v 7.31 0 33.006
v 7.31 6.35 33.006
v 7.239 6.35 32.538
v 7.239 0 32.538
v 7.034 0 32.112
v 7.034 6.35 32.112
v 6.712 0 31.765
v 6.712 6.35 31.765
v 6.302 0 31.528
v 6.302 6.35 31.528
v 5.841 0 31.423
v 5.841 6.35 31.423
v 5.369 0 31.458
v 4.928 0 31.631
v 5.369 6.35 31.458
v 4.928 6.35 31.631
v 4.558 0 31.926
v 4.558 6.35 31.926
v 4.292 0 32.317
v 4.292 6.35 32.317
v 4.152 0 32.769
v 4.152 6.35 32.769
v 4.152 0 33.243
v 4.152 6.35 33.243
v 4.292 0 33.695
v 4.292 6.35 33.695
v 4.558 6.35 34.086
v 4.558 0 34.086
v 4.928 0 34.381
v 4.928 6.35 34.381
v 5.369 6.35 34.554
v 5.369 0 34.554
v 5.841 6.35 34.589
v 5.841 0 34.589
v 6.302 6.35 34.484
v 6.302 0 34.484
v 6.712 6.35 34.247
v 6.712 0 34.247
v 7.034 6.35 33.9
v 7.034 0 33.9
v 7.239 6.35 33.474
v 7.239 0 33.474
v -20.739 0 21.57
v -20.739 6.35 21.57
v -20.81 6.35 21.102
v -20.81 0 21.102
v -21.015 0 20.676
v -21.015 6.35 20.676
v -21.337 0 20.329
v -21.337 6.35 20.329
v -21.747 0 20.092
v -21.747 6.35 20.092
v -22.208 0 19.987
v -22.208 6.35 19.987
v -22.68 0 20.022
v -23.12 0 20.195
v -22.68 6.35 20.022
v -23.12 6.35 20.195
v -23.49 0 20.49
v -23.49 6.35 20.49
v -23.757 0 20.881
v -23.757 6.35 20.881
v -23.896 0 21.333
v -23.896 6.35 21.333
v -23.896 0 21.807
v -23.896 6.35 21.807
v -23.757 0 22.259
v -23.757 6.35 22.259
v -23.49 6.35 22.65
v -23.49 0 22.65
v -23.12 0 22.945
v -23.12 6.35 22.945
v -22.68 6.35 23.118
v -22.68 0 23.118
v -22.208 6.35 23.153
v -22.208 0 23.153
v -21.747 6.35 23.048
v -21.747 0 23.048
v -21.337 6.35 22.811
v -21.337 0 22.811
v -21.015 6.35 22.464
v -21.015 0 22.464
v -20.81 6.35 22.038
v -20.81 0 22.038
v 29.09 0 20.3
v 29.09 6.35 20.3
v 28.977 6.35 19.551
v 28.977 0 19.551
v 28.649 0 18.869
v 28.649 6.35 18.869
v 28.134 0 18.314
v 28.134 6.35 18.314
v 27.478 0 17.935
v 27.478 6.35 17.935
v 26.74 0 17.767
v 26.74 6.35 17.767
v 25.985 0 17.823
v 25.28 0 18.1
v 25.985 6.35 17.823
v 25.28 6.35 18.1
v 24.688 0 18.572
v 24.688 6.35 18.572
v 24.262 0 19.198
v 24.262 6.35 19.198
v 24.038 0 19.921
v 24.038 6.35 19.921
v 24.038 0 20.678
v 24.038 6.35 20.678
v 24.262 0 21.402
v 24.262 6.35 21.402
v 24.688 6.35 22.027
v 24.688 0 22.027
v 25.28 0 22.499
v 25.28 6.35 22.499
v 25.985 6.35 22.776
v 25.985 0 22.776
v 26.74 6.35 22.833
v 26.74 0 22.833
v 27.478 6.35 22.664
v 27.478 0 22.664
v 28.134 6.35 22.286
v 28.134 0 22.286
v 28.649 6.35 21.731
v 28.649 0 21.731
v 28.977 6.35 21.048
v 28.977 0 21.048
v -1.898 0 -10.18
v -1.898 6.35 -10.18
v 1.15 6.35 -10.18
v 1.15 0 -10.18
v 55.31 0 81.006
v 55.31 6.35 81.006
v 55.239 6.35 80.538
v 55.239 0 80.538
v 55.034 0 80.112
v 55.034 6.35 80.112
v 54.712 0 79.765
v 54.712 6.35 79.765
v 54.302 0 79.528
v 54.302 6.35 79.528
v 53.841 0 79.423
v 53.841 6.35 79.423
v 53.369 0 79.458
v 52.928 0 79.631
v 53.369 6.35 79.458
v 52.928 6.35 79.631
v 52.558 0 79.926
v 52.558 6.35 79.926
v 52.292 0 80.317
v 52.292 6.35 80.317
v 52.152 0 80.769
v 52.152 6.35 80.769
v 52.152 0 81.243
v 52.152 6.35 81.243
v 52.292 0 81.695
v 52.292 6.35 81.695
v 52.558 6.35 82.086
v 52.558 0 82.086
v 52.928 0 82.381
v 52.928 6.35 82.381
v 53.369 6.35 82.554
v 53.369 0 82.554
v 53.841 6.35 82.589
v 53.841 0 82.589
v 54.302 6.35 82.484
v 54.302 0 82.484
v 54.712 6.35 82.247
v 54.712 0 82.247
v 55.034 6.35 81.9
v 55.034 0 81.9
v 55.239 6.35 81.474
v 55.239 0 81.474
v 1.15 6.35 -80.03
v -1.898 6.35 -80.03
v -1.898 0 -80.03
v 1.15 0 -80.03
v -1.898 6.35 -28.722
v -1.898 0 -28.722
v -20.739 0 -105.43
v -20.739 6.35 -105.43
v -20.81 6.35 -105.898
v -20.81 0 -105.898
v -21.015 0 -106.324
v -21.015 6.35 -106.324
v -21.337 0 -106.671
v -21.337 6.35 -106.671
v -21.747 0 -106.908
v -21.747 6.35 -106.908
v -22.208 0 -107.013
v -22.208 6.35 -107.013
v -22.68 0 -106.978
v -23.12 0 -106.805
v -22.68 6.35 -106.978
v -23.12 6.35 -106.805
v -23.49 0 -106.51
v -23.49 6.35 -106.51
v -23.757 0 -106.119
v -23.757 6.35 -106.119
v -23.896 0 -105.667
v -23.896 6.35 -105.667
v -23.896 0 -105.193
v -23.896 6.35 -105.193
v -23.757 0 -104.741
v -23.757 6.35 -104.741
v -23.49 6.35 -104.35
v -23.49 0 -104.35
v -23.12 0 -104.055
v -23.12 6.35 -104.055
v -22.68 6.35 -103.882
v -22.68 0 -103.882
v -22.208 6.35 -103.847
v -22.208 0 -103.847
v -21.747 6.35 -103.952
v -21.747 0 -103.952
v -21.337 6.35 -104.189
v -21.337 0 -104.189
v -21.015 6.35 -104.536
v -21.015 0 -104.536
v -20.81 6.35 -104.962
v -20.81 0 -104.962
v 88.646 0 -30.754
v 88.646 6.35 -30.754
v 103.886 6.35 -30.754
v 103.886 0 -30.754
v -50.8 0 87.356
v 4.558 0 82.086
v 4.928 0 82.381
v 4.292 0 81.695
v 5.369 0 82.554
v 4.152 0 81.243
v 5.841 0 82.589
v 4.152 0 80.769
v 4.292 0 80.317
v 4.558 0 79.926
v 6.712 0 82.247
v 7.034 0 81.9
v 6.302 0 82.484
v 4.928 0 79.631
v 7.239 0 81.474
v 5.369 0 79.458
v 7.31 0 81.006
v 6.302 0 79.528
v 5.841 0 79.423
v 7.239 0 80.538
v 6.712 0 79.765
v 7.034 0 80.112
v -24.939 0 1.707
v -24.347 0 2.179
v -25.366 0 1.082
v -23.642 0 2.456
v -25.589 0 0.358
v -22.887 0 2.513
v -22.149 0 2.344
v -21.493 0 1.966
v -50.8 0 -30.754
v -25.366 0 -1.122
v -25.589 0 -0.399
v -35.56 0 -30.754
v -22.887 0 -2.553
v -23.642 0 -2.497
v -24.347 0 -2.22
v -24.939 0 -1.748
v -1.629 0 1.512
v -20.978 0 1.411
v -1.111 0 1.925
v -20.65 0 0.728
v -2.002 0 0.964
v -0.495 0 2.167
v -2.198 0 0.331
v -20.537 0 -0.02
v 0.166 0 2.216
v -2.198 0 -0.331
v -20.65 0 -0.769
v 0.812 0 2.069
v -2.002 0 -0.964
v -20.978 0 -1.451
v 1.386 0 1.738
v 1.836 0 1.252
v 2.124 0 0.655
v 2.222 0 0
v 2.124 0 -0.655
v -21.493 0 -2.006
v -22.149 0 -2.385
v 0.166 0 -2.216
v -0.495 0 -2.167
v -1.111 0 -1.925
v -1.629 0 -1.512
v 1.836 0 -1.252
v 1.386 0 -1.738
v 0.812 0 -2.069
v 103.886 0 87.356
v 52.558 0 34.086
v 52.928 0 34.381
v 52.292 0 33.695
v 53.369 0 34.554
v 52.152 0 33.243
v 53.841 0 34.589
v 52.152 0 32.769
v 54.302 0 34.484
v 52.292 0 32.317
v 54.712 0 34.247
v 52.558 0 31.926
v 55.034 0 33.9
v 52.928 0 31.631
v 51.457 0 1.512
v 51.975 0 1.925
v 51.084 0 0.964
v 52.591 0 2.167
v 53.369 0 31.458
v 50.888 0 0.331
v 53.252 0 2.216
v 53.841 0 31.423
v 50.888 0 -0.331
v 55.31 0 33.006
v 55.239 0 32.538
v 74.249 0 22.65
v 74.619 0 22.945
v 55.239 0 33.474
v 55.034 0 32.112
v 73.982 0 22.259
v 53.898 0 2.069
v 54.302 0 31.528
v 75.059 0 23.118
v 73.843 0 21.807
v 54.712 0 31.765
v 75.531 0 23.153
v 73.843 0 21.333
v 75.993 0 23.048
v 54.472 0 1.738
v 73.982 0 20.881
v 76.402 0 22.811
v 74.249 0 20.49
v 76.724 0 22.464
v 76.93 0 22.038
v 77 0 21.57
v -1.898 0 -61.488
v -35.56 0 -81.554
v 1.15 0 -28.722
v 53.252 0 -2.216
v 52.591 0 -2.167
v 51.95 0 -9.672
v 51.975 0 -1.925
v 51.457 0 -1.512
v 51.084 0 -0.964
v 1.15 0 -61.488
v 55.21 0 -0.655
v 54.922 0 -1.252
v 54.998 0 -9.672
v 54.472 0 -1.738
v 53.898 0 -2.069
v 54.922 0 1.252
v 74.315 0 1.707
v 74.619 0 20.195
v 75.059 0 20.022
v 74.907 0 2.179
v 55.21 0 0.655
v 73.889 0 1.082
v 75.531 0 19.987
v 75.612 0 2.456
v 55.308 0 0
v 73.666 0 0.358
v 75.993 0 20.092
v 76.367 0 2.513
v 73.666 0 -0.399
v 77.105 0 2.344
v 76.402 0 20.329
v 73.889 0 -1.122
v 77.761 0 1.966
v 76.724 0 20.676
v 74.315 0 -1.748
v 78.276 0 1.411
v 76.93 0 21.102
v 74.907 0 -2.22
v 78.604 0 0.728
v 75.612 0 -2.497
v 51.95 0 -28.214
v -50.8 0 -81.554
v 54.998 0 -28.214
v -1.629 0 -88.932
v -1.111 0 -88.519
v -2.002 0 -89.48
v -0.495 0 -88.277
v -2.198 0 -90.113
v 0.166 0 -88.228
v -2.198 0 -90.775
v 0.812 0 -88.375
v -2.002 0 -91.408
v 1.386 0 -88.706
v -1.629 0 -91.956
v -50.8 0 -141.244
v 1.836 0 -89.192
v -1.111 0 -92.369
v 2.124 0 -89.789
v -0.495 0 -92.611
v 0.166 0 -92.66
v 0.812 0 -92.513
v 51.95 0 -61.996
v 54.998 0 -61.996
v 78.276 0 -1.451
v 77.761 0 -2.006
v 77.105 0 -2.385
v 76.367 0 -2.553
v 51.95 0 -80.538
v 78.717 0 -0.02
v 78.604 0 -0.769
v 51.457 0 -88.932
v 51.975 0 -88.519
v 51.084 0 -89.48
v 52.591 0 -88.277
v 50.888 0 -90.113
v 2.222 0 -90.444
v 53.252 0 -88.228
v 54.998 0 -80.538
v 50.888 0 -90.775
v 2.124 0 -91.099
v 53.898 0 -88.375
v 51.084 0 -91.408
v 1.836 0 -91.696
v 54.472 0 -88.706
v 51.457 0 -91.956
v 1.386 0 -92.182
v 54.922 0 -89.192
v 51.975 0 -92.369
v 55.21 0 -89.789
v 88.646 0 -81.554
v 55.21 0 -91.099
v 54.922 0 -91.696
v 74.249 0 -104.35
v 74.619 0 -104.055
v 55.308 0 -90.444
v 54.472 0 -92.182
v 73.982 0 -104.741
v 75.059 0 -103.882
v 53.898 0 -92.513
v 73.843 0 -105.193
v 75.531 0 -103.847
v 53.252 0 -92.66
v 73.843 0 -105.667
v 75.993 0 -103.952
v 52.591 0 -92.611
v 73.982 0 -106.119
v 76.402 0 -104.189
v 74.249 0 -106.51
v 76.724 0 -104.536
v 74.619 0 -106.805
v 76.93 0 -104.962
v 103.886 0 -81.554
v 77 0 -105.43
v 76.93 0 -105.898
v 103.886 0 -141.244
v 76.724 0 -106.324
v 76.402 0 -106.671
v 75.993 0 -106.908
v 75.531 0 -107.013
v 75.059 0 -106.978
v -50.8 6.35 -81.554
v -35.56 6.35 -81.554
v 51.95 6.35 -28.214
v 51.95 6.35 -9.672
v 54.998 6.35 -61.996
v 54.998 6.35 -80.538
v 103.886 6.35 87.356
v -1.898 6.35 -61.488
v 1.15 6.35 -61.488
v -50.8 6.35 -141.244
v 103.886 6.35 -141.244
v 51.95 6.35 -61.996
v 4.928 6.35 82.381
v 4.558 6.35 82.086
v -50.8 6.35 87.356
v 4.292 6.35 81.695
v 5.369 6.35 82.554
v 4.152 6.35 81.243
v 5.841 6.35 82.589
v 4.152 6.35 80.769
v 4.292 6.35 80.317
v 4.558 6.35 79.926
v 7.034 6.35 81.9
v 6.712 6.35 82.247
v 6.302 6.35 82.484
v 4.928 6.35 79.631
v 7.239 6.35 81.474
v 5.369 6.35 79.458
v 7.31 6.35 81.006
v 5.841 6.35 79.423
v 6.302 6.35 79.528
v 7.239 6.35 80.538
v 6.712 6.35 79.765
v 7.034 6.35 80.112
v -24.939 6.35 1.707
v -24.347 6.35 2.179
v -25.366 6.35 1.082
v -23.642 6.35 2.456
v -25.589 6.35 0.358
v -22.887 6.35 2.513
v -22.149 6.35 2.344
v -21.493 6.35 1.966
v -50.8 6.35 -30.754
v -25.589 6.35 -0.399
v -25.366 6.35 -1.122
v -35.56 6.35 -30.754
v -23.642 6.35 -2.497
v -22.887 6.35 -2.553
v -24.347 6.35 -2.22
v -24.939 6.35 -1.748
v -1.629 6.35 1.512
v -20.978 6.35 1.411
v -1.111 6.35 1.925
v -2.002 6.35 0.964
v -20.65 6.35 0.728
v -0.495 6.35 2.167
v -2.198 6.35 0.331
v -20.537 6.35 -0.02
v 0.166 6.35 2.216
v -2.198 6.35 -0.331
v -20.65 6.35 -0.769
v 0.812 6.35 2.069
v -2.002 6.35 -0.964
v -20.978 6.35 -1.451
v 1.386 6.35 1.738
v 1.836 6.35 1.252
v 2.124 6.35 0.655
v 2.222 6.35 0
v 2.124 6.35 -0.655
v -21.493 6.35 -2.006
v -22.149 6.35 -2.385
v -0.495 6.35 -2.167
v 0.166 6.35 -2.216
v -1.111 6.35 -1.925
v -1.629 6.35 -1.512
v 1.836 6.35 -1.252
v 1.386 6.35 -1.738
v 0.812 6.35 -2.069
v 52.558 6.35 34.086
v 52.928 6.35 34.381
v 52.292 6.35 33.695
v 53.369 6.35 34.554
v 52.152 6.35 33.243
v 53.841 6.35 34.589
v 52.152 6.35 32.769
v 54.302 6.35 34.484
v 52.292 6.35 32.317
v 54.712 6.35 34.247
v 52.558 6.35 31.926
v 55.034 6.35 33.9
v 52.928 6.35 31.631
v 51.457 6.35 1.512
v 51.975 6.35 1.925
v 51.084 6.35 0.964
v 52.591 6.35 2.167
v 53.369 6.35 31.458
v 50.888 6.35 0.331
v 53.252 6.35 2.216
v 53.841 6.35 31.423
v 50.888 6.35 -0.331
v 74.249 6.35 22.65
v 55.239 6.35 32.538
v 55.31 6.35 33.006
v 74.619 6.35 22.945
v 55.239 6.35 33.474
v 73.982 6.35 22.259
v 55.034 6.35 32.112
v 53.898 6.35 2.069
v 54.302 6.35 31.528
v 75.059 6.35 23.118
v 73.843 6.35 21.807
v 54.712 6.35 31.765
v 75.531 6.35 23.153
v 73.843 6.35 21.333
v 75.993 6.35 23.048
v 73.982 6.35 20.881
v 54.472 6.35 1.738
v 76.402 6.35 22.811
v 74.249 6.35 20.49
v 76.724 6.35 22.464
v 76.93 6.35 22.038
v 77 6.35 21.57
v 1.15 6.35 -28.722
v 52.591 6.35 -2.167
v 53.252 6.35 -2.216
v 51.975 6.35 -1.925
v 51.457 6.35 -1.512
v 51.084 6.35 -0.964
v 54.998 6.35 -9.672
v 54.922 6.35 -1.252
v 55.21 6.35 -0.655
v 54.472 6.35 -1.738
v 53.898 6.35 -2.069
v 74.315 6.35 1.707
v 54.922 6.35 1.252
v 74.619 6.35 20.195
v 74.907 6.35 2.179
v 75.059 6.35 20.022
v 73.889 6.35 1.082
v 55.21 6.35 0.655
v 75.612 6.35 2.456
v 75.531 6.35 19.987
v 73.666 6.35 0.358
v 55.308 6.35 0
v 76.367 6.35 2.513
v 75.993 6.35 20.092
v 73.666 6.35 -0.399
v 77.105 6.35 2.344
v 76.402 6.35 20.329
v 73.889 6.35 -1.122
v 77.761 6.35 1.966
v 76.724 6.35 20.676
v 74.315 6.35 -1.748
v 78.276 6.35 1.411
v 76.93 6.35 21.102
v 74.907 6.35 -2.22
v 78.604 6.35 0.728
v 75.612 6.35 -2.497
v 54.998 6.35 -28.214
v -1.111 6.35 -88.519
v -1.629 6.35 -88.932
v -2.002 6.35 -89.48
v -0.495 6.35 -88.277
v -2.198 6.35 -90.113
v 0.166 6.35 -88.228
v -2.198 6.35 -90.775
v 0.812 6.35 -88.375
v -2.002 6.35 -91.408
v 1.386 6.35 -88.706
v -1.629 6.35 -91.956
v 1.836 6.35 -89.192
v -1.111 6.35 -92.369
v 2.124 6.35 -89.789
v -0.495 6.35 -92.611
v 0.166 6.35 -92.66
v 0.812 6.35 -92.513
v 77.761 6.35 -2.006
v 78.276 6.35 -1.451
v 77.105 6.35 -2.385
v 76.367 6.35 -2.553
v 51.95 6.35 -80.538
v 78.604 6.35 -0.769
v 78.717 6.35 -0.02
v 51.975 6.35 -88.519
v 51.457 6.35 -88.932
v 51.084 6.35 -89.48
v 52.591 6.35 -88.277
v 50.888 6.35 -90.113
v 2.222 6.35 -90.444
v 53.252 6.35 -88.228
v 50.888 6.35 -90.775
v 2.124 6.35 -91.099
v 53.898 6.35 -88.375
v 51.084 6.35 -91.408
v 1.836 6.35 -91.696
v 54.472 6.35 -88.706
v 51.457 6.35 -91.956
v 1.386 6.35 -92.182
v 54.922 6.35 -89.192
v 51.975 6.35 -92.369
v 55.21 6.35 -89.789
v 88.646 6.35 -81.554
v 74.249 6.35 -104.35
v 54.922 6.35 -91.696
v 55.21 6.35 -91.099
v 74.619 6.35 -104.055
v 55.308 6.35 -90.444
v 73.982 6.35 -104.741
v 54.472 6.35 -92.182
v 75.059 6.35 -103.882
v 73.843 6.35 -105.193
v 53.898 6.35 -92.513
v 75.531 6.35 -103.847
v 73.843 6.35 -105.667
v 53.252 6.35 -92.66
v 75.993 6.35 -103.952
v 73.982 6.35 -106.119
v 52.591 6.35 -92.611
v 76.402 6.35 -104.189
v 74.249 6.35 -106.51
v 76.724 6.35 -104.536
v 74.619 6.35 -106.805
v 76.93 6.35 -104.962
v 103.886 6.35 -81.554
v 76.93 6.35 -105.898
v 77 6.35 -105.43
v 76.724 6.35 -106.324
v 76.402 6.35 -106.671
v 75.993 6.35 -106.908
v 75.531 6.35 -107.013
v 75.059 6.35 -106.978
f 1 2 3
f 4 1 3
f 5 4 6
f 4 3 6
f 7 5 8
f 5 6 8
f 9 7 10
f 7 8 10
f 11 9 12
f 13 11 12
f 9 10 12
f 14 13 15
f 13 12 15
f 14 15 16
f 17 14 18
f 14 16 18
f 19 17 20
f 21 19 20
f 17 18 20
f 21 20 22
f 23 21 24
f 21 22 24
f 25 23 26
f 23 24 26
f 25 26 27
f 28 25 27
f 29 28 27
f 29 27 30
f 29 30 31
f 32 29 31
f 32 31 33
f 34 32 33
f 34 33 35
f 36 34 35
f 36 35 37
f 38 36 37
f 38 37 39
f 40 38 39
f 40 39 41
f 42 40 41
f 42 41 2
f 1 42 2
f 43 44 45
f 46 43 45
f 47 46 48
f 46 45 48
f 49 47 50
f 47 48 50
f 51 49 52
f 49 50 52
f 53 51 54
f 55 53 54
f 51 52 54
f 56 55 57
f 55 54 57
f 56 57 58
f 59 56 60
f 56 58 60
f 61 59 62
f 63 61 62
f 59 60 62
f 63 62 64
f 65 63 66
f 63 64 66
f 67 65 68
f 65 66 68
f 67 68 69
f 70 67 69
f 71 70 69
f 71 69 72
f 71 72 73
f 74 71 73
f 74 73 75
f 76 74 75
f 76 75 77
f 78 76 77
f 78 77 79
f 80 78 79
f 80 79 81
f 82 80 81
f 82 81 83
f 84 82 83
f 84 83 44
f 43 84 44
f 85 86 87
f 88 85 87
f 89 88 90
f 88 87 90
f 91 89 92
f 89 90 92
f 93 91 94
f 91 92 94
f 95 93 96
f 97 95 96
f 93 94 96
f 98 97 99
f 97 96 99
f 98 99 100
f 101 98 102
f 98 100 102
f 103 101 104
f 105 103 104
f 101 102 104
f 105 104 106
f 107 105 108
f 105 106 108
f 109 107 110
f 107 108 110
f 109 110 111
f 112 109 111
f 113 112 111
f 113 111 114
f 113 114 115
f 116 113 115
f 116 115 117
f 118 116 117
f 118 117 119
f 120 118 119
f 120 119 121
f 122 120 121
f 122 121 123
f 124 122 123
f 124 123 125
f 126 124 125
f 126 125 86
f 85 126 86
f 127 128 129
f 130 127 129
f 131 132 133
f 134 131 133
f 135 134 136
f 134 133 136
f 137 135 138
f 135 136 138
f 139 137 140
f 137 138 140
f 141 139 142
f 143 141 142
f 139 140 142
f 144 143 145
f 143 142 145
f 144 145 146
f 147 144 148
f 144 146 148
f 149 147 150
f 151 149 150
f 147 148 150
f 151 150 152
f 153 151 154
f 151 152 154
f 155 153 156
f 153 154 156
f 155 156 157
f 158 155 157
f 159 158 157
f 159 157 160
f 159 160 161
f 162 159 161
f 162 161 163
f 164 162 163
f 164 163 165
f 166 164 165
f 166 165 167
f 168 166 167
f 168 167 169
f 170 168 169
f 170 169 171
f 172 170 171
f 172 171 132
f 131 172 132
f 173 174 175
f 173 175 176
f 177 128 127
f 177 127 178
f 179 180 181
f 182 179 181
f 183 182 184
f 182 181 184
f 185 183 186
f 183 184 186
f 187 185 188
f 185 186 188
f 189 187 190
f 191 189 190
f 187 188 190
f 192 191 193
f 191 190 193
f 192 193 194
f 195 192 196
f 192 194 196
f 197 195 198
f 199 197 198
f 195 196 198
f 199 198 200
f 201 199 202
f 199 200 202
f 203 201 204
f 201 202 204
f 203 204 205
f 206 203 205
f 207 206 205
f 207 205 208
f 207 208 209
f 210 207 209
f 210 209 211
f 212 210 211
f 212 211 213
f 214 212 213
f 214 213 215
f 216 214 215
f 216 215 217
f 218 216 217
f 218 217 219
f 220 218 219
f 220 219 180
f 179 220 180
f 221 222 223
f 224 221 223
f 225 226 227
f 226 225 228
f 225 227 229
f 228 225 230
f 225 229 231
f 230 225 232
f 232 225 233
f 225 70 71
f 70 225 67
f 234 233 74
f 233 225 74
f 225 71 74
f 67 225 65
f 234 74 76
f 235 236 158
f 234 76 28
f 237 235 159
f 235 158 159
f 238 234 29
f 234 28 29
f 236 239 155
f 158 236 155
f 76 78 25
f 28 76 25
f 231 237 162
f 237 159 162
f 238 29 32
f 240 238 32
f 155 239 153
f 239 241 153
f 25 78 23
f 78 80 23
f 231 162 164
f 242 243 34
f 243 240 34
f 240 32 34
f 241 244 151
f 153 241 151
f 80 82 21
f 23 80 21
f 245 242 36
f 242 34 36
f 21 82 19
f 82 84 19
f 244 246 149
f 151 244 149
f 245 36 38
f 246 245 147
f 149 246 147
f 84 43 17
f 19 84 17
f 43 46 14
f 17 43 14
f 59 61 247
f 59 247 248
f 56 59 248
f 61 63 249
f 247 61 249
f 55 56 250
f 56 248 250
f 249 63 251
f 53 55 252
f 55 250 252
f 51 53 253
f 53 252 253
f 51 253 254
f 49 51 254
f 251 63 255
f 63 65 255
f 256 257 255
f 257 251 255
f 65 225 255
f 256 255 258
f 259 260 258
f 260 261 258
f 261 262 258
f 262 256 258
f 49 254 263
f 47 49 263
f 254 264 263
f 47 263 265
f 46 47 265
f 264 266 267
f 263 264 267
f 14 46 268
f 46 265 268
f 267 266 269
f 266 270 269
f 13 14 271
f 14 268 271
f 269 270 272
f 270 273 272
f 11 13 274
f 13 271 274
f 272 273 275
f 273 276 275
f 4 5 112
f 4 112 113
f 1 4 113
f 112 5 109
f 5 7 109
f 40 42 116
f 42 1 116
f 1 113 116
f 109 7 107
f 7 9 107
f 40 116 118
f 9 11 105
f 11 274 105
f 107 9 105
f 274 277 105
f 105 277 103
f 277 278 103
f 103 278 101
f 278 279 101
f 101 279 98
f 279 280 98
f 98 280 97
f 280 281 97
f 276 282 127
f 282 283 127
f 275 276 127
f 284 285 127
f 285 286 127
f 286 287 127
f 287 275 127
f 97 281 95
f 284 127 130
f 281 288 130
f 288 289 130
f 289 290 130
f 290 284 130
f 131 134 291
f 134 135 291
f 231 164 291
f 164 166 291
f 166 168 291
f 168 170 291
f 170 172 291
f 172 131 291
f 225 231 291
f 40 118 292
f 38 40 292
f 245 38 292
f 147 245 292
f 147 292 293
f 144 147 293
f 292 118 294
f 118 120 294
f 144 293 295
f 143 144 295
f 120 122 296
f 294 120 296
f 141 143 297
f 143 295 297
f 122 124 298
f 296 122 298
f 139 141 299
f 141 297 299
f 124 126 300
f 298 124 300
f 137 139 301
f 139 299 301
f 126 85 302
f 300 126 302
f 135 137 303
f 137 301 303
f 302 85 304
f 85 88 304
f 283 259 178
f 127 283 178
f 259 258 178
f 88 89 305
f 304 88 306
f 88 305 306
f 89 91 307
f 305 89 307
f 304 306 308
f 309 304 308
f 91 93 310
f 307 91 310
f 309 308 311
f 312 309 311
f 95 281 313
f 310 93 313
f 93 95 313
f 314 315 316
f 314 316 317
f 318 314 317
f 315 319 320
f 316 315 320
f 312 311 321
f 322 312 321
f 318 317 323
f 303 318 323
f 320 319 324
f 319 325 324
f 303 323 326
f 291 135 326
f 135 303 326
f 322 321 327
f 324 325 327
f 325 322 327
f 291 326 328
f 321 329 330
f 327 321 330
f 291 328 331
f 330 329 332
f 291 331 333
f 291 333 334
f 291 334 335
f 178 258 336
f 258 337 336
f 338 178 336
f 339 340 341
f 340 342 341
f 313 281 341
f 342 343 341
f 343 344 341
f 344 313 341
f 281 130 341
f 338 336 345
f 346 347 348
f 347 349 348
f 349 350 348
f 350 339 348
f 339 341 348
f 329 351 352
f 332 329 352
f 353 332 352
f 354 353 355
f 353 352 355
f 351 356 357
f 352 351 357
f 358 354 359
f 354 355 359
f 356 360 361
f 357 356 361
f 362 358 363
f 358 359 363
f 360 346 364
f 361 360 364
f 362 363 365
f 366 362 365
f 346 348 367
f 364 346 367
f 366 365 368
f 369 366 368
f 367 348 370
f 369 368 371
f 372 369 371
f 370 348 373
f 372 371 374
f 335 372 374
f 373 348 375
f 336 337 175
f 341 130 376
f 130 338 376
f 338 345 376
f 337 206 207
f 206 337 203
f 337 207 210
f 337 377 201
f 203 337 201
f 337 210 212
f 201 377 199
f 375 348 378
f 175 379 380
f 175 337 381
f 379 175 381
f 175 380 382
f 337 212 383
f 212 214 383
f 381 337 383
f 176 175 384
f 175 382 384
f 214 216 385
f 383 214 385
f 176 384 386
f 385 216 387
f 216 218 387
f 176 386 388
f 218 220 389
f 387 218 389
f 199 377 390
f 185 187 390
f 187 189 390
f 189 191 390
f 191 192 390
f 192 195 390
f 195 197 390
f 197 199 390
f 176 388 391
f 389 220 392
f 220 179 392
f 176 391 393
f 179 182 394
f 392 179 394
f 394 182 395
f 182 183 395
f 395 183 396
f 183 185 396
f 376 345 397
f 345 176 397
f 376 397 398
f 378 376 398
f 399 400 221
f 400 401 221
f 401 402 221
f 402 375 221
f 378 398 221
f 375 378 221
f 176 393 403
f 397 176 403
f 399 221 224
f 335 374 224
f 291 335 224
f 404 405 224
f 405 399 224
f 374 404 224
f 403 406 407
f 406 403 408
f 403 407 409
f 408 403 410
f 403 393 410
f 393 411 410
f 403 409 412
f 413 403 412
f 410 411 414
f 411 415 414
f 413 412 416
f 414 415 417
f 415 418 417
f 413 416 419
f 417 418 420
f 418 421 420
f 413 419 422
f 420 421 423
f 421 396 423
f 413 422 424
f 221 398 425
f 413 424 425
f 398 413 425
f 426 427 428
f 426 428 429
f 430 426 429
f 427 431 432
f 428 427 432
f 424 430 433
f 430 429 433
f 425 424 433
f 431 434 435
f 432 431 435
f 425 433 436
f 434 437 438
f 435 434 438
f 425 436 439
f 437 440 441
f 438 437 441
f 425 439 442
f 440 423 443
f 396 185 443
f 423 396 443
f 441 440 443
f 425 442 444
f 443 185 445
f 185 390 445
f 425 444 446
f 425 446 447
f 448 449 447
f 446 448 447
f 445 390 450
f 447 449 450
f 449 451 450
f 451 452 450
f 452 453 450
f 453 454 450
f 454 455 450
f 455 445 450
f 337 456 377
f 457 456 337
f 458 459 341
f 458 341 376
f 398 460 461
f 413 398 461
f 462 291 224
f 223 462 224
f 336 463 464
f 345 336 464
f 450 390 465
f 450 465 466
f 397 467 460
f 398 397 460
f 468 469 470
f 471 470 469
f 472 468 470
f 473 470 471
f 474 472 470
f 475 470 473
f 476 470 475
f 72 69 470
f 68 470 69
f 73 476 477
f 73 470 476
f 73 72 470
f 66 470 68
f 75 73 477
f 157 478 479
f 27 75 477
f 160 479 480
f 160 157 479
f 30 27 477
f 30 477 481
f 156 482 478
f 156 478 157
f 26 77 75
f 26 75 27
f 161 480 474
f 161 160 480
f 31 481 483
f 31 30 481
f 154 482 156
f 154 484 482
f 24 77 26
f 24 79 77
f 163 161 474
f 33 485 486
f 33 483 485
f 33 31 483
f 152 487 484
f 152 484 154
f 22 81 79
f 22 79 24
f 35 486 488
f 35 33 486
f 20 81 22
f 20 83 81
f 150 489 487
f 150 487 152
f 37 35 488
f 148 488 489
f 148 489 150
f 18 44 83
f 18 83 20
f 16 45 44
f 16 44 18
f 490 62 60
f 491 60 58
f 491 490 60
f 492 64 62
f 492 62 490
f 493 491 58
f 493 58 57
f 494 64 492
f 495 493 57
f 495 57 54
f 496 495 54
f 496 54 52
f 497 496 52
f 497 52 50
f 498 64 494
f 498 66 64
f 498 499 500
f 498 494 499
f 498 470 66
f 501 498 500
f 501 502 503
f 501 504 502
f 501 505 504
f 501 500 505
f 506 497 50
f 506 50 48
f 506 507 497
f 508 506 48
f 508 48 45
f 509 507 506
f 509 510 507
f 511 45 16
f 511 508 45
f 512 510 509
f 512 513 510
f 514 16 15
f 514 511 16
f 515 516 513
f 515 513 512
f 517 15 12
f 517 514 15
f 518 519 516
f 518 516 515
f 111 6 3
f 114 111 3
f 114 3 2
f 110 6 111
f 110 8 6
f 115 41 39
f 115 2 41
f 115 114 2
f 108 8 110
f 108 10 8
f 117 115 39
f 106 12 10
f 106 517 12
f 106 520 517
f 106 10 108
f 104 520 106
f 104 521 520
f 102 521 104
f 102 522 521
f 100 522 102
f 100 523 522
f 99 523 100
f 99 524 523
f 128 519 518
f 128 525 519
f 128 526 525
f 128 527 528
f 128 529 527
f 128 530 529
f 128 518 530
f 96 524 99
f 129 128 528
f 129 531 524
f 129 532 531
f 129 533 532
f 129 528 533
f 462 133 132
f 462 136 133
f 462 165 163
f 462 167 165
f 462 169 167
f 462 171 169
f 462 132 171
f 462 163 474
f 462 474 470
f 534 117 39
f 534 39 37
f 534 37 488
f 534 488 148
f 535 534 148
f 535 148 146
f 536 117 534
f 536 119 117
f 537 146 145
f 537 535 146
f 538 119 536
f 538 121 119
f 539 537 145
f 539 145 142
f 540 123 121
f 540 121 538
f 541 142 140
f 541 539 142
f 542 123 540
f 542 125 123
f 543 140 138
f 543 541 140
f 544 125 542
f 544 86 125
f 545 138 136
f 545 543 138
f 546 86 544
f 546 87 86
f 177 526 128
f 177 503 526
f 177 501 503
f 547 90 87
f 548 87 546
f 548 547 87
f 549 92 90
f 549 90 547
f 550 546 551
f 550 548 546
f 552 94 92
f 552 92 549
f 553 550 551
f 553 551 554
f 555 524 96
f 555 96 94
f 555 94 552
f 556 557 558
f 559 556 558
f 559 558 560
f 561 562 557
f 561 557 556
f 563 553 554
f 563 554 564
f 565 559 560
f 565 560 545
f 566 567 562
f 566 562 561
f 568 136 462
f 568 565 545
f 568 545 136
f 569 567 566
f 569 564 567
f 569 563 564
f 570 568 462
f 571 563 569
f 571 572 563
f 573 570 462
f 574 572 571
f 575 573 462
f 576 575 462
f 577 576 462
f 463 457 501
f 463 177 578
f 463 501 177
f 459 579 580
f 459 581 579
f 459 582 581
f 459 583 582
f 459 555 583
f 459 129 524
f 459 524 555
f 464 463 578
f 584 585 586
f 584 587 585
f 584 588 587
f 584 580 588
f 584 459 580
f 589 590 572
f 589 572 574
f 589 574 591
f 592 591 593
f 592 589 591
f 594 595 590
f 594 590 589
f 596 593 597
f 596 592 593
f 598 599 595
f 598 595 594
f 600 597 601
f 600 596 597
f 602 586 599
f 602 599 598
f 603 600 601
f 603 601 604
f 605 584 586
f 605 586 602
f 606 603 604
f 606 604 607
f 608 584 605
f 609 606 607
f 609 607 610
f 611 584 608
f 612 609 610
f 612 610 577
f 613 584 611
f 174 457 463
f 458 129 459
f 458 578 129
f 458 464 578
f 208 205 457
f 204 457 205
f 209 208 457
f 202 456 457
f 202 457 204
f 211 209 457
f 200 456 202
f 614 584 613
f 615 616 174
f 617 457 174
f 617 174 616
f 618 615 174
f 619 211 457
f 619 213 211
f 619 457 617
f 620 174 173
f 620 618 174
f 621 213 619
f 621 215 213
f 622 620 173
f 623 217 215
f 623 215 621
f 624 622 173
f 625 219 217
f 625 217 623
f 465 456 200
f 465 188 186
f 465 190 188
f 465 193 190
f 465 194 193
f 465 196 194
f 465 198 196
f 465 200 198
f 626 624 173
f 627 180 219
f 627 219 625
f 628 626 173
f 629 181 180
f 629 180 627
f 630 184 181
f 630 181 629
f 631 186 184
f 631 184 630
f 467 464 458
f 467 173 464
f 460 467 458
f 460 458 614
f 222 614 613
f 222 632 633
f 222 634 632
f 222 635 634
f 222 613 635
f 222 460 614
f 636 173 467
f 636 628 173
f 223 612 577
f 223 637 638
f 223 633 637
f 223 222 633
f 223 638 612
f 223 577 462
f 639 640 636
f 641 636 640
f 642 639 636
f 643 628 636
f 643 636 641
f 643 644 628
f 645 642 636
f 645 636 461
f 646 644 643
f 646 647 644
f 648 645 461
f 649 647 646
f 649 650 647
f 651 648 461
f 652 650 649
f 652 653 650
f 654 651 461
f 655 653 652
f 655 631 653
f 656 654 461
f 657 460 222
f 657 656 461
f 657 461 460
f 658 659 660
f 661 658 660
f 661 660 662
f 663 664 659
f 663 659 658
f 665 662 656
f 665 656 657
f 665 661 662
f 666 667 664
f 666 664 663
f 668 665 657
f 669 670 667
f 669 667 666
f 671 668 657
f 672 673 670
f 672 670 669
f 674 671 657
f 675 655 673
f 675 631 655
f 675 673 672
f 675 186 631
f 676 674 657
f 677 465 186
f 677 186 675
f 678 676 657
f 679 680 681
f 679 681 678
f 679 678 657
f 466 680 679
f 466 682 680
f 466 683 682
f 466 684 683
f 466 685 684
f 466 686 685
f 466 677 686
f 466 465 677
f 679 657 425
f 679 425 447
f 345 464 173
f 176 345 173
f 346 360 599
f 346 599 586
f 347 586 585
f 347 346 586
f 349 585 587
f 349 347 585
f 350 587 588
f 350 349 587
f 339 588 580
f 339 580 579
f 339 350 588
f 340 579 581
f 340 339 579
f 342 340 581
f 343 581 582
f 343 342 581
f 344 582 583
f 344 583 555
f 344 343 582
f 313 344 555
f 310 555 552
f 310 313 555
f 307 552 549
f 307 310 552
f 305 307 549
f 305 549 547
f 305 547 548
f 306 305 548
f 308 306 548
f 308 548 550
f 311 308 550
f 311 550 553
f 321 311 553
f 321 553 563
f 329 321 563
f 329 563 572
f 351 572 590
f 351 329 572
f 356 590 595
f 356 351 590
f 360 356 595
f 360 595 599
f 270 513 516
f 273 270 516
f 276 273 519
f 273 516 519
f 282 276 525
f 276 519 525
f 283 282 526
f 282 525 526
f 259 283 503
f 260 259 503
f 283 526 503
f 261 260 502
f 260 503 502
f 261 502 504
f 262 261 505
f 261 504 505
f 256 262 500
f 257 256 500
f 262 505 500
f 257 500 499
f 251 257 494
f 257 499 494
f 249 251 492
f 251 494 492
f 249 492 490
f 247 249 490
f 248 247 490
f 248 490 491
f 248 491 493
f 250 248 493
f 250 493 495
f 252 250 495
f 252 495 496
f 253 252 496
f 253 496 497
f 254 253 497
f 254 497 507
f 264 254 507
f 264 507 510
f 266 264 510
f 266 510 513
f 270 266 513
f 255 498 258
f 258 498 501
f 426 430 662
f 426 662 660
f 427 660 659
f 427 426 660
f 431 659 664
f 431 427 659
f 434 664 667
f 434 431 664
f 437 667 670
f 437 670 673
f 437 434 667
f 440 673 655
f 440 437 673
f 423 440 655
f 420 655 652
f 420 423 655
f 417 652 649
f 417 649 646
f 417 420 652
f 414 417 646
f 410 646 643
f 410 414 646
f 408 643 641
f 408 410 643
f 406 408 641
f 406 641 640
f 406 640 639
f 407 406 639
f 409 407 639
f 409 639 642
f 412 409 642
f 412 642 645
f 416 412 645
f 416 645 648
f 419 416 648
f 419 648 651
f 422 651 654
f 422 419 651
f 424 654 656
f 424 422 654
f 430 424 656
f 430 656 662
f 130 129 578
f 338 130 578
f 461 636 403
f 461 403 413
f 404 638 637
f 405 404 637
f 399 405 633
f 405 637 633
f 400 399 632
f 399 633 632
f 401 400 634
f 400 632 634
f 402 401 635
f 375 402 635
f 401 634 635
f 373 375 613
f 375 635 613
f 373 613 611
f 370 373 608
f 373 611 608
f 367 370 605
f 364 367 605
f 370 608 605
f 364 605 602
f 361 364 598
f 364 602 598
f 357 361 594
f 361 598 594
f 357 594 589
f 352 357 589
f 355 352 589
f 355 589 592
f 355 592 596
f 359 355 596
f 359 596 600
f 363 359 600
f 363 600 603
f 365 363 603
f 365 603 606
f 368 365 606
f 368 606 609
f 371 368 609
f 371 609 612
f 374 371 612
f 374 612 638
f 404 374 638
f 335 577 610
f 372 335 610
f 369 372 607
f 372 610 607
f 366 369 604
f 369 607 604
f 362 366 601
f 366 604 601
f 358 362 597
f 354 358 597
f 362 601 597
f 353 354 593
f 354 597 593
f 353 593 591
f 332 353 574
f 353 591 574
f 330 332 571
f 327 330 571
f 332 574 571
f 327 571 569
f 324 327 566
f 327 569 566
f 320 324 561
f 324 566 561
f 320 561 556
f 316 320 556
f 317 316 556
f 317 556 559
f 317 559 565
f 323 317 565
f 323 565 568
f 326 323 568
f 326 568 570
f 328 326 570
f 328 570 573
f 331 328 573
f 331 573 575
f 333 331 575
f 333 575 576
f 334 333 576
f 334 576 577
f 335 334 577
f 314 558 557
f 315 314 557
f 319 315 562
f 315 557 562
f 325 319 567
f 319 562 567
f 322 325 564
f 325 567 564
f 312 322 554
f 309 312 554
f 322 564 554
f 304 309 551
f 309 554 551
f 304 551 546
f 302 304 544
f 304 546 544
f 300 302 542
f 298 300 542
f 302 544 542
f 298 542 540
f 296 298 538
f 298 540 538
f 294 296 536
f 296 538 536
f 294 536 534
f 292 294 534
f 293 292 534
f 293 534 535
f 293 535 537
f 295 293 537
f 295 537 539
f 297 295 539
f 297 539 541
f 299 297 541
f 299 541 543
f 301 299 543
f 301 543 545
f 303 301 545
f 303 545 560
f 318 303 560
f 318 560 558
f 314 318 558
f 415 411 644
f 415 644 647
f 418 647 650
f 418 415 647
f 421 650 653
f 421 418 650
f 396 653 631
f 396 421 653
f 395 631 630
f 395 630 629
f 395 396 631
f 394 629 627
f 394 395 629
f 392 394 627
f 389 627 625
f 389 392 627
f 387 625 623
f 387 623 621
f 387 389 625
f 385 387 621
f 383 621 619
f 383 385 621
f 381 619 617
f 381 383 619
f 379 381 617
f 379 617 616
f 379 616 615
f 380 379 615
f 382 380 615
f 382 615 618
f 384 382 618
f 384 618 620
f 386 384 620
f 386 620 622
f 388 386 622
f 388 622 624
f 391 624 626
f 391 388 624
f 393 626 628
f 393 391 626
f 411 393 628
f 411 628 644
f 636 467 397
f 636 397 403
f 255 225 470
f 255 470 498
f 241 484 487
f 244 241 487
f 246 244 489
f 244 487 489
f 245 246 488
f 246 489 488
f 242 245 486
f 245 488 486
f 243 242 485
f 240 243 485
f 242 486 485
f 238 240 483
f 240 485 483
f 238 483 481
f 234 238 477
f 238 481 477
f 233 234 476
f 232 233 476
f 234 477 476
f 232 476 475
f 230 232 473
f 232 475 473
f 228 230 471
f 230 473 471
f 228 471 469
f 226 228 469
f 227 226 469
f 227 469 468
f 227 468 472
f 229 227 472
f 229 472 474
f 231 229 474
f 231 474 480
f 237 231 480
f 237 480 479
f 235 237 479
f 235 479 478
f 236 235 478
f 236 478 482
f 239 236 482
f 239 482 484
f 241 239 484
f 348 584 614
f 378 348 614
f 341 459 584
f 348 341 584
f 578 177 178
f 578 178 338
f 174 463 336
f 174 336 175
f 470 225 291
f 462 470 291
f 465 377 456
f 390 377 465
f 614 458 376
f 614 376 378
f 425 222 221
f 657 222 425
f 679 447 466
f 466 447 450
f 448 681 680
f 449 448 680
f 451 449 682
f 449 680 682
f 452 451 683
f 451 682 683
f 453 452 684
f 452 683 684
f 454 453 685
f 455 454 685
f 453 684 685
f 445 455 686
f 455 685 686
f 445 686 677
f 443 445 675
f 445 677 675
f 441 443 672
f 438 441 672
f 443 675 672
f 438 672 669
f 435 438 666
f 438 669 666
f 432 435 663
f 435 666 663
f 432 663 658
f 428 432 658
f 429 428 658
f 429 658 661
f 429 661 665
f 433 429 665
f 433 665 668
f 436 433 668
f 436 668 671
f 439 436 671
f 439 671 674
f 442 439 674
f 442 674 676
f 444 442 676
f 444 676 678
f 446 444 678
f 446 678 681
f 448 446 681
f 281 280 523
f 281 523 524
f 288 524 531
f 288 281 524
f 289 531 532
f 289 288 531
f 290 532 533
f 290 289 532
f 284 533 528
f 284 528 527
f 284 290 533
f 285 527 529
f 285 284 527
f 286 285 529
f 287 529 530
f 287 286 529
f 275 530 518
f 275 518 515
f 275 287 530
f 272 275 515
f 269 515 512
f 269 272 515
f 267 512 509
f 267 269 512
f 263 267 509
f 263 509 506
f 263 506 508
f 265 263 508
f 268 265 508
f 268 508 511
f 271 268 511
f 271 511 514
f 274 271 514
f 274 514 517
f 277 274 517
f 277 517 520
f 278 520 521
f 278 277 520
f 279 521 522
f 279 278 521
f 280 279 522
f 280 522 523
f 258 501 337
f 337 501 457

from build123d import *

# Parameters (mm, degrees)
SKETCH2_W           = 154.686
SKETCH2_H           = 228.6
BOSS_EXTRUDE1_DEPTH = 6.35
SKETCH1_R           = 2.2225
CUT_EXTRUDE1_DEPTH  = 6.35
SKETCH3_W           = 15.24
SKETCH3_H           = 50.8
CUT_EXTRUDE2_DEPTH  = 6.35
SKETCH8_R           = 2.54
CUT_EXTRUDE3_DEPTH  = 17.78
SKETCH9_R           = 1.5875
CUT_EXTRUDE4_DEPTH  = 17.78
SKETCH10_R          = 1.5875
CUT_EXTRUDE5_DEPTH  = 10.16
SKETCH12_W          = 3.048
SKETCH12_H          = 18.542
CUT_EXTRUDE7_DEPTH  = 8.255


with BuildPart() as part:
    # Sketch2 → Boss-Extrude1 (new body)
    with BuildSketch(Plane(origin=(0, 0, 0), x_dir=(1, 0, 0), z_dir=(0, 1, 0))):
        with Locations((26.543, 26.944051327)):
            Rectangle(SKETCH2_W, SKETCH2_H)
    extrude(amount=BOSS_EXTRUDE1_DEPTH)

    # Sketch1 → Cut-Extrude1 (cut)
    with BuildSketch(Plane(origin=(0, 0, 0), x_dir=(1, 0, 0), z_dir=(0, 1, 0))):
        with Locations((0, 90.444051327)):
            Circle(SKETCH1_R)
        with Locations((53.086, 90.444051327)):
            Circle(SKETCH1_R)
        Circle(SKETCH1_R)
        with Locations((53.086, 0)):
            Circle(SKETCH1_R)
    extrude(amount=CUT_EXTRUDE1_DEPTH, mode=Mode.SUBTRACT)

    # Sketch3 → Cut-Extrude2 (cut)
    with BuildSketch(Plane(origin=(0, 6.35, 0), x_dir=(1, 0, 0), z_dir=(0, 1, 0))):
        with Locations((96.266, 56.154051327)):
            Rectangle(SKETCH3_W, SKETCH3_H)
        with Locations((-43.18, 56.154051327)):
            Rectangle(SKETCH3_W, SKETCH3_H)
    extrude(amount=-CUT_EXTRUDE2_DEPTH, mode=Mode.SUBTRACT)

    # Sketch8 → Cut-Extrude3 (cut)
    with BuildSketch(Plane(origin=(0, 6.35, 0), x_dir=(1, 0, 0), z_dir=(0, 1, 0))):
        with Locations((26.550112, -20.29968)):
            Circle(SKETCH8_R)
        with Locations((-23.077082804, 0.02032)):
            Circle(SKETCH8_R)
        with Locations((76.177306804, 0.02032)):
            Circle(SKETCH8_R)
    extrude(amount=-CUT_EXTRUDE3_DEPTH, mode=Mode.SUBTRACT)

    # Sketch9 → Cut-Extrude4 (cut)
    with BuildSketch(Plane(origin=(0, 6.35, 0), x_dir=(1, 0, 0), z_dir=(0, 1, 0))):
        with Locations((53.722112, -33.005948673)):
            Circle(SKETCH9_R)
        with Locations((5.722112, -33.005948673)):
            Circle(SKETCH9_R)
        with Locations((53.722112, -81.005948673)):
            Circle(SKETCH9_R)
        with Locations((5.722112, -81.005948673)):
            Circle(SKETCH9_R)
    extrude(amount=-CUT_EXTRUDE4_DEPTH, mode=Mode.SUBTRACT)

    # Sketch10 → Cut-Extrude5 (cut)
    with BuildSketch(Plane(origin=(0, 6.35, 0), x_dir=(1, 0, 0), z_dir=(0, 1, 0))):
        with Locations((-22.3266, 105.430051327)):
            Circle(SKETCH10_R)
        with Locations((-22.3266, -21.569948673)):
            Circle(SKETCH10_R)
        with Locations((75.4126, 105.430051327)):
            Circle(SKETCH10_R)
        with Locations((75.4126, -21.569948673)):
            Circle(SKETCH10_R)
    extrude(amount=-CUT_EXTRUDE5_DEPTH, mode=Mode.SUBTRACT)

    # Sketch12 → Cut-Extrude7 (cut)
    with BuildSketch(Plane(origin=(0, 6.35, 0), x_dir=(1, 0, 0), z_dir=(0, 1, 0))):
        with Locations((-0.373888, 19.451051327)):
            Rectangle(SKETCH12_W, SKETCH12_H)
        with Locations((-0.373888, 70.759051327)):
            Rectangle(SKETCH12_W, SKETCH12_H)
        with Locations((53.474112, 71.267051327)):
            Rectangle(SKETCH12_W, SKETCH12_H)
        with Locations((53.474112, 18.943051327)):
            Rectangle(SKETCH12_W, SKETCH12_H)
    extrude(amount=-CUT_EXTRUDE7_DEPTH, mode=Mode.SUBTRACT)


solid = part.part
